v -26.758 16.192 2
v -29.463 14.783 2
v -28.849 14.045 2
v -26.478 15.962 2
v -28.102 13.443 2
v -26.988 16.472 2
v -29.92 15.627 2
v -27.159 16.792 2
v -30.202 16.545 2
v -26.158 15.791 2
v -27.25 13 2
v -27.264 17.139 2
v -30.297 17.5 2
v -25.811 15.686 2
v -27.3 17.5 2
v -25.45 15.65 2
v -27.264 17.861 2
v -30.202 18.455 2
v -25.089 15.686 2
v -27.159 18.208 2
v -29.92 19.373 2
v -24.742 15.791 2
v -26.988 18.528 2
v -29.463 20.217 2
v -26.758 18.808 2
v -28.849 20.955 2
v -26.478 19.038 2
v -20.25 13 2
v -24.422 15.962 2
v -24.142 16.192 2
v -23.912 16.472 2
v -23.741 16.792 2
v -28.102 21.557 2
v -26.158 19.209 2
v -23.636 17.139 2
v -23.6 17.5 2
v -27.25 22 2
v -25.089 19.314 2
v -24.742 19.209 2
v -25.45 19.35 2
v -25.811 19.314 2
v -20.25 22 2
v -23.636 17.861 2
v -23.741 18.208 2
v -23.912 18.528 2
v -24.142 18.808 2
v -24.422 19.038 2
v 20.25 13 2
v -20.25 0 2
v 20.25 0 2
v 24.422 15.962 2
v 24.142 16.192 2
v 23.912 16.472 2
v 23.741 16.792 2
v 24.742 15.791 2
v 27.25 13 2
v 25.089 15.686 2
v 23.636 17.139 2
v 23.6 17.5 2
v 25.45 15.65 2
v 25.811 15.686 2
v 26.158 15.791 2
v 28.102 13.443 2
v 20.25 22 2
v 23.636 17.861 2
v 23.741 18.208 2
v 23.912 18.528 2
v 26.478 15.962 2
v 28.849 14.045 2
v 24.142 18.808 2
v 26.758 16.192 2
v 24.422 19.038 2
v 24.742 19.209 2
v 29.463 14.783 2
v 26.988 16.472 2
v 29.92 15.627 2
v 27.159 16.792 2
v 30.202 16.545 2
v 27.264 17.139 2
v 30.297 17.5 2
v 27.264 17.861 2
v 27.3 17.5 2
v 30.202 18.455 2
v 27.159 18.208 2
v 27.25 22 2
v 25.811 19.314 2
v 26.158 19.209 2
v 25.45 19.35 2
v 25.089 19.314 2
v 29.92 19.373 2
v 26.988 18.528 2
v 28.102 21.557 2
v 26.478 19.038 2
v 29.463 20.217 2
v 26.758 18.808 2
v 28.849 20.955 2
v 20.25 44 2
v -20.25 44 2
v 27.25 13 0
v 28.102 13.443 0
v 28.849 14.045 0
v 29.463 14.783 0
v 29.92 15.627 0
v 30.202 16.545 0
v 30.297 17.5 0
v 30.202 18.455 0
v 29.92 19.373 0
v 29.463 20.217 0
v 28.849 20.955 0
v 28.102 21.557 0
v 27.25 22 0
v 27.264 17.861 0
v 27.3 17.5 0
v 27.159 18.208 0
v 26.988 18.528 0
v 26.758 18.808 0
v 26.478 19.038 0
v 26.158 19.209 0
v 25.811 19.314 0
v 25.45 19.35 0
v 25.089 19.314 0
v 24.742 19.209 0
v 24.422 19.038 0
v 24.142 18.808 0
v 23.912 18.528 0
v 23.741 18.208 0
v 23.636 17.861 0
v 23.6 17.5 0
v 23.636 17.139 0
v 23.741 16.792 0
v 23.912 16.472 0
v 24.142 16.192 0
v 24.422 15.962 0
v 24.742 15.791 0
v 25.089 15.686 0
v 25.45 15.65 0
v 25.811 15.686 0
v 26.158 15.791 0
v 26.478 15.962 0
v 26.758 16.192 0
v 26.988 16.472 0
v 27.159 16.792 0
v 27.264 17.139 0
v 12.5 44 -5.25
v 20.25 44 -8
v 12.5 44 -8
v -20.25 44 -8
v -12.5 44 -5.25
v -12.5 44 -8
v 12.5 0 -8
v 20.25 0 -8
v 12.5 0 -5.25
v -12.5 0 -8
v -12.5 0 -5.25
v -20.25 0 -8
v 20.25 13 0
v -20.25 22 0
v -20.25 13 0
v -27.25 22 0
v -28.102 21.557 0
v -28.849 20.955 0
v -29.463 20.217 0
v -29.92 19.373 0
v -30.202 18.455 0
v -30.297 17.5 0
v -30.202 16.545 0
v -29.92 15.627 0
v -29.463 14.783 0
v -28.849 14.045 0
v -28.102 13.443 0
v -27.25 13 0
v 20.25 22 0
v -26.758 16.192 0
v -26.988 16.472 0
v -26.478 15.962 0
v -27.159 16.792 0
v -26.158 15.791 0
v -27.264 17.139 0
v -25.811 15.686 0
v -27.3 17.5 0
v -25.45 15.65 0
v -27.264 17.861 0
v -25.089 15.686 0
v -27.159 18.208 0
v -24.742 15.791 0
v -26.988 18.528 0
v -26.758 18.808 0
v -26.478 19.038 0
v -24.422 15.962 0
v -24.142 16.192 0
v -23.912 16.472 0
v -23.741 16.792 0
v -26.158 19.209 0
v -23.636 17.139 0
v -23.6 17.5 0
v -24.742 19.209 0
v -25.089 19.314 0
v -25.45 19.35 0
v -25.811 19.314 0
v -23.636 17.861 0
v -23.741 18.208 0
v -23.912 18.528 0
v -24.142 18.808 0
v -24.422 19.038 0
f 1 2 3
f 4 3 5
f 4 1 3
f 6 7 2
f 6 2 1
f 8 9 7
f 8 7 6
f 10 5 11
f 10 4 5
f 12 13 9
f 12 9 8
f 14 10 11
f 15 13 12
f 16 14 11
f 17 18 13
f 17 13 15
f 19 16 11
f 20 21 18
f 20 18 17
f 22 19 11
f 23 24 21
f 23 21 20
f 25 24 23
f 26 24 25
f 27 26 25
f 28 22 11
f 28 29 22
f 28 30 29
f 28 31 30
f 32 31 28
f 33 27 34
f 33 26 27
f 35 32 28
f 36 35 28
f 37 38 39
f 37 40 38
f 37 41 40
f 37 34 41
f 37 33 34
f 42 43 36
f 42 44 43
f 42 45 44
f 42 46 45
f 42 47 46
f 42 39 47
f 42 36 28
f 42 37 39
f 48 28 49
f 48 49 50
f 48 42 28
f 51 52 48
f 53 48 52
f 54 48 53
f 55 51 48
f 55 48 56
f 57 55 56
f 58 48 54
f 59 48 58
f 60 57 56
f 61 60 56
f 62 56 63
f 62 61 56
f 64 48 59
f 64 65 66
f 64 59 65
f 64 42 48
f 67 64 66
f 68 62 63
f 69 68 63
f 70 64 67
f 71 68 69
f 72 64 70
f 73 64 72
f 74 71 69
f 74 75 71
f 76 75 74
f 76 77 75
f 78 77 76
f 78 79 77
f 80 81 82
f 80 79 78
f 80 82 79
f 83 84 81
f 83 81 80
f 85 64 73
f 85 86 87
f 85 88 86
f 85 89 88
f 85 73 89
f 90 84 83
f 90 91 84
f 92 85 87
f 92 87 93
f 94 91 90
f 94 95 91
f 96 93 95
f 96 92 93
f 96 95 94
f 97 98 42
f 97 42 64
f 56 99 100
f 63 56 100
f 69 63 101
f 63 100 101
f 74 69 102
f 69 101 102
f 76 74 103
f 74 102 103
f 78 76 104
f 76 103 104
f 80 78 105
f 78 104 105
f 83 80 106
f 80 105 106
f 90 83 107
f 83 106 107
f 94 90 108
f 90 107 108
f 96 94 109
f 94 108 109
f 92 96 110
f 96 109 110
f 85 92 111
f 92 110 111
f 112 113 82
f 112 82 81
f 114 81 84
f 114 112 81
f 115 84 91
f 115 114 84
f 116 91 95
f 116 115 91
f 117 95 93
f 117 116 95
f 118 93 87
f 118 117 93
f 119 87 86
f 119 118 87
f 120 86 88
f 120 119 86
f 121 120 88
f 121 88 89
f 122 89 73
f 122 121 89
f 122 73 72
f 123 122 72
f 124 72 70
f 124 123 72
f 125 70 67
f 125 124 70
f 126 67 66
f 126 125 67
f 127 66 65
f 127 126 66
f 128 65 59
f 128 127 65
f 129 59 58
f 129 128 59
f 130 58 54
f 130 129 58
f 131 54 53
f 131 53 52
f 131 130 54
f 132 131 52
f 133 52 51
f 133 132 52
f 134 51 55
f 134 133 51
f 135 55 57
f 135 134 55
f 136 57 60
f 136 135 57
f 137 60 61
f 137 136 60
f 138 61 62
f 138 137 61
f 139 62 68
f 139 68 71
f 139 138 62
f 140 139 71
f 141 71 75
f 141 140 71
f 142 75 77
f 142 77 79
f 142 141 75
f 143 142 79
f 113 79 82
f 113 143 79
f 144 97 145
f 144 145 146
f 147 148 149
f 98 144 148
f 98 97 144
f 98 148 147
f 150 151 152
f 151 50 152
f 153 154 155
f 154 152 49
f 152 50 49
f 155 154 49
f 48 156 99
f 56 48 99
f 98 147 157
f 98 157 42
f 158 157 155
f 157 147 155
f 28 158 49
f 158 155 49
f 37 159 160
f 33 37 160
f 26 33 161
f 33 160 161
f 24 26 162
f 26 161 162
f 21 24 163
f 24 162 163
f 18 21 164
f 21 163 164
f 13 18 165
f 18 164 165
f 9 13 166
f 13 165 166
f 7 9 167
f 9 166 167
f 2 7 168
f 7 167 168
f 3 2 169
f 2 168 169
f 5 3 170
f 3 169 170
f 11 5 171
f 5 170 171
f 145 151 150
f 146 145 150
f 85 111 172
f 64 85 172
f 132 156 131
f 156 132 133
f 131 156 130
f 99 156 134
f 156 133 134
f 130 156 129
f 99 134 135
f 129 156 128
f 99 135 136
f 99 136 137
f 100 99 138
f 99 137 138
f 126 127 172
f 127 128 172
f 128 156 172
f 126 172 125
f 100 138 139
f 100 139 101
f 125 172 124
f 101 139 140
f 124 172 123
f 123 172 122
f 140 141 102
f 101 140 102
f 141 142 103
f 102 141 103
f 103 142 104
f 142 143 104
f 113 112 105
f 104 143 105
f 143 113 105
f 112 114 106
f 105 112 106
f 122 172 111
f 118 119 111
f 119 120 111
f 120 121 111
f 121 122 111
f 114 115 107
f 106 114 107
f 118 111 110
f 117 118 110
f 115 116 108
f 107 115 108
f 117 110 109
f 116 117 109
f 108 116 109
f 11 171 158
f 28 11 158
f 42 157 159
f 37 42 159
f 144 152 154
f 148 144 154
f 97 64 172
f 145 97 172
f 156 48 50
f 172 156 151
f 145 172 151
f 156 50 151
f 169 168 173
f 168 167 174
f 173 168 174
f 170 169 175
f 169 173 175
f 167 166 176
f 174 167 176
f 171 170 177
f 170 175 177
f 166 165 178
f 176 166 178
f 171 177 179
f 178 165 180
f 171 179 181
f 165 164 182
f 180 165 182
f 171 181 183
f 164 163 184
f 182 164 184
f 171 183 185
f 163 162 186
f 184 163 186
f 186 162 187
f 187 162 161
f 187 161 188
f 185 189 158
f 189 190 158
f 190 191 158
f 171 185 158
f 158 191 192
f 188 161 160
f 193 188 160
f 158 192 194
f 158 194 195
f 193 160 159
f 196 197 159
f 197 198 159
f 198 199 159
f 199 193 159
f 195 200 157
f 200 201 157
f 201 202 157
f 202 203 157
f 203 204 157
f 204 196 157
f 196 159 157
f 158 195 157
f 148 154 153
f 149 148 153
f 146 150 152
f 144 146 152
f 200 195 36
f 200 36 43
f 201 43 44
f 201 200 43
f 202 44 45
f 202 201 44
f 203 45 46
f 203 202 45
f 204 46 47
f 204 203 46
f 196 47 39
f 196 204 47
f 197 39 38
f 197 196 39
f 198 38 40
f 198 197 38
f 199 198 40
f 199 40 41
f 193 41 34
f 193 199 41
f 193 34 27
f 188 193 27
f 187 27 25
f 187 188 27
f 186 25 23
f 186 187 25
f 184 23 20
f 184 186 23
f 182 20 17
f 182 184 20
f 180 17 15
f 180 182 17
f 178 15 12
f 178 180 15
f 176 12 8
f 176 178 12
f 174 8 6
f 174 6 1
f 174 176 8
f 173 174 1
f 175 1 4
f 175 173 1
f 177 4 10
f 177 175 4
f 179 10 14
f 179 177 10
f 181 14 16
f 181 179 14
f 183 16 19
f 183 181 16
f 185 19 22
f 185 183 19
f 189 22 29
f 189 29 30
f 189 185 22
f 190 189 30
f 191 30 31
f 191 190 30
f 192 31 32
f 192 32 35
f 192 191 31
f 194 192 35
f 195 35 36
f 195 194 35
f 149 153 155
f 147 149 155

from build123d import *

# Parameters (mm, degrees)
EXTRUDE001_DEPTH                     = 44
EXTRUDE001_ONTO_SKETCH001_ROLL_ANGLE = 90
SKETCH_R                             = 1.85
EXTRUDE_DEPTH                        = 2


with BuildPart() as extrude001:
    # Sketch001 as drawn → Extrude001 (new)
    with BuildSketch(Plane.XY):
        Polygon((-20.25, 0), (20.25, 0), (20.25, -8), (12.5, -8), (12.5, -5.25), (-12.5, -5.25), (-12.5, -8), (-20.25, -8), align=None)
    extrude(amount=-EXTRUDE001_DEPTH)


with BuildPart() as extrude001_1:
    # Extrude001 onto Sketch001 roll: moved
    add(extrude001.part.rotate(Axis((0, 0, 0), (1, 0, 0)), EXTRUDE001_ONTO_SKETCH001_ROLL_ANGLE))


with BuildPart() as extrude001_2:
    # Extrude001 onto Sketch001 placement: moved
    add(extrude001_1.part)


with BuildPart() as fusion:
    # Sketch → Extrude (new body)
    with BuildSketch(Plane.XY):
        with BuildLine():
            Line((-20.25, 44), (-20.25, 22))
            Line((-20.25, 22), (-27.25, 22))
            ThreePointArc((-27.25, 22), (-30.296648, 17.5), (-27.25, 13))
            Line((-27.25, 13), (-20.25, 13))
            Line((-20.25, 13), (-20.25, 0))
            Line((-20.25, 0), (20.25, 0))
            Line((20.25, 0), (20.25, 13))
            Line((20.25, 13), (27.25, 13))
            ThreePointArc((27.25, 13), (30.296648, 17.5), (27.25, 22))
            Line((27.25, 22), (20.25, 22))
            Line((20.25, 22), (20.25, 44))
            Line((20.25, 44), (-20.25, 44))
        make_face()
        with Locations((-25.45, 17.5)):
            Circle(SKETCH_R, mode=Mode.SUBTRACT)
        with Locations((25.45, 17.5)):
            Circle(SKETCH_R, mode=Mode.SUBTRACT)
    extrude(amount=EXTRUDE_DEPTH)

    # Fusion: union Extrude001
    add(extrude001_2.part)


solid = fusion.part
